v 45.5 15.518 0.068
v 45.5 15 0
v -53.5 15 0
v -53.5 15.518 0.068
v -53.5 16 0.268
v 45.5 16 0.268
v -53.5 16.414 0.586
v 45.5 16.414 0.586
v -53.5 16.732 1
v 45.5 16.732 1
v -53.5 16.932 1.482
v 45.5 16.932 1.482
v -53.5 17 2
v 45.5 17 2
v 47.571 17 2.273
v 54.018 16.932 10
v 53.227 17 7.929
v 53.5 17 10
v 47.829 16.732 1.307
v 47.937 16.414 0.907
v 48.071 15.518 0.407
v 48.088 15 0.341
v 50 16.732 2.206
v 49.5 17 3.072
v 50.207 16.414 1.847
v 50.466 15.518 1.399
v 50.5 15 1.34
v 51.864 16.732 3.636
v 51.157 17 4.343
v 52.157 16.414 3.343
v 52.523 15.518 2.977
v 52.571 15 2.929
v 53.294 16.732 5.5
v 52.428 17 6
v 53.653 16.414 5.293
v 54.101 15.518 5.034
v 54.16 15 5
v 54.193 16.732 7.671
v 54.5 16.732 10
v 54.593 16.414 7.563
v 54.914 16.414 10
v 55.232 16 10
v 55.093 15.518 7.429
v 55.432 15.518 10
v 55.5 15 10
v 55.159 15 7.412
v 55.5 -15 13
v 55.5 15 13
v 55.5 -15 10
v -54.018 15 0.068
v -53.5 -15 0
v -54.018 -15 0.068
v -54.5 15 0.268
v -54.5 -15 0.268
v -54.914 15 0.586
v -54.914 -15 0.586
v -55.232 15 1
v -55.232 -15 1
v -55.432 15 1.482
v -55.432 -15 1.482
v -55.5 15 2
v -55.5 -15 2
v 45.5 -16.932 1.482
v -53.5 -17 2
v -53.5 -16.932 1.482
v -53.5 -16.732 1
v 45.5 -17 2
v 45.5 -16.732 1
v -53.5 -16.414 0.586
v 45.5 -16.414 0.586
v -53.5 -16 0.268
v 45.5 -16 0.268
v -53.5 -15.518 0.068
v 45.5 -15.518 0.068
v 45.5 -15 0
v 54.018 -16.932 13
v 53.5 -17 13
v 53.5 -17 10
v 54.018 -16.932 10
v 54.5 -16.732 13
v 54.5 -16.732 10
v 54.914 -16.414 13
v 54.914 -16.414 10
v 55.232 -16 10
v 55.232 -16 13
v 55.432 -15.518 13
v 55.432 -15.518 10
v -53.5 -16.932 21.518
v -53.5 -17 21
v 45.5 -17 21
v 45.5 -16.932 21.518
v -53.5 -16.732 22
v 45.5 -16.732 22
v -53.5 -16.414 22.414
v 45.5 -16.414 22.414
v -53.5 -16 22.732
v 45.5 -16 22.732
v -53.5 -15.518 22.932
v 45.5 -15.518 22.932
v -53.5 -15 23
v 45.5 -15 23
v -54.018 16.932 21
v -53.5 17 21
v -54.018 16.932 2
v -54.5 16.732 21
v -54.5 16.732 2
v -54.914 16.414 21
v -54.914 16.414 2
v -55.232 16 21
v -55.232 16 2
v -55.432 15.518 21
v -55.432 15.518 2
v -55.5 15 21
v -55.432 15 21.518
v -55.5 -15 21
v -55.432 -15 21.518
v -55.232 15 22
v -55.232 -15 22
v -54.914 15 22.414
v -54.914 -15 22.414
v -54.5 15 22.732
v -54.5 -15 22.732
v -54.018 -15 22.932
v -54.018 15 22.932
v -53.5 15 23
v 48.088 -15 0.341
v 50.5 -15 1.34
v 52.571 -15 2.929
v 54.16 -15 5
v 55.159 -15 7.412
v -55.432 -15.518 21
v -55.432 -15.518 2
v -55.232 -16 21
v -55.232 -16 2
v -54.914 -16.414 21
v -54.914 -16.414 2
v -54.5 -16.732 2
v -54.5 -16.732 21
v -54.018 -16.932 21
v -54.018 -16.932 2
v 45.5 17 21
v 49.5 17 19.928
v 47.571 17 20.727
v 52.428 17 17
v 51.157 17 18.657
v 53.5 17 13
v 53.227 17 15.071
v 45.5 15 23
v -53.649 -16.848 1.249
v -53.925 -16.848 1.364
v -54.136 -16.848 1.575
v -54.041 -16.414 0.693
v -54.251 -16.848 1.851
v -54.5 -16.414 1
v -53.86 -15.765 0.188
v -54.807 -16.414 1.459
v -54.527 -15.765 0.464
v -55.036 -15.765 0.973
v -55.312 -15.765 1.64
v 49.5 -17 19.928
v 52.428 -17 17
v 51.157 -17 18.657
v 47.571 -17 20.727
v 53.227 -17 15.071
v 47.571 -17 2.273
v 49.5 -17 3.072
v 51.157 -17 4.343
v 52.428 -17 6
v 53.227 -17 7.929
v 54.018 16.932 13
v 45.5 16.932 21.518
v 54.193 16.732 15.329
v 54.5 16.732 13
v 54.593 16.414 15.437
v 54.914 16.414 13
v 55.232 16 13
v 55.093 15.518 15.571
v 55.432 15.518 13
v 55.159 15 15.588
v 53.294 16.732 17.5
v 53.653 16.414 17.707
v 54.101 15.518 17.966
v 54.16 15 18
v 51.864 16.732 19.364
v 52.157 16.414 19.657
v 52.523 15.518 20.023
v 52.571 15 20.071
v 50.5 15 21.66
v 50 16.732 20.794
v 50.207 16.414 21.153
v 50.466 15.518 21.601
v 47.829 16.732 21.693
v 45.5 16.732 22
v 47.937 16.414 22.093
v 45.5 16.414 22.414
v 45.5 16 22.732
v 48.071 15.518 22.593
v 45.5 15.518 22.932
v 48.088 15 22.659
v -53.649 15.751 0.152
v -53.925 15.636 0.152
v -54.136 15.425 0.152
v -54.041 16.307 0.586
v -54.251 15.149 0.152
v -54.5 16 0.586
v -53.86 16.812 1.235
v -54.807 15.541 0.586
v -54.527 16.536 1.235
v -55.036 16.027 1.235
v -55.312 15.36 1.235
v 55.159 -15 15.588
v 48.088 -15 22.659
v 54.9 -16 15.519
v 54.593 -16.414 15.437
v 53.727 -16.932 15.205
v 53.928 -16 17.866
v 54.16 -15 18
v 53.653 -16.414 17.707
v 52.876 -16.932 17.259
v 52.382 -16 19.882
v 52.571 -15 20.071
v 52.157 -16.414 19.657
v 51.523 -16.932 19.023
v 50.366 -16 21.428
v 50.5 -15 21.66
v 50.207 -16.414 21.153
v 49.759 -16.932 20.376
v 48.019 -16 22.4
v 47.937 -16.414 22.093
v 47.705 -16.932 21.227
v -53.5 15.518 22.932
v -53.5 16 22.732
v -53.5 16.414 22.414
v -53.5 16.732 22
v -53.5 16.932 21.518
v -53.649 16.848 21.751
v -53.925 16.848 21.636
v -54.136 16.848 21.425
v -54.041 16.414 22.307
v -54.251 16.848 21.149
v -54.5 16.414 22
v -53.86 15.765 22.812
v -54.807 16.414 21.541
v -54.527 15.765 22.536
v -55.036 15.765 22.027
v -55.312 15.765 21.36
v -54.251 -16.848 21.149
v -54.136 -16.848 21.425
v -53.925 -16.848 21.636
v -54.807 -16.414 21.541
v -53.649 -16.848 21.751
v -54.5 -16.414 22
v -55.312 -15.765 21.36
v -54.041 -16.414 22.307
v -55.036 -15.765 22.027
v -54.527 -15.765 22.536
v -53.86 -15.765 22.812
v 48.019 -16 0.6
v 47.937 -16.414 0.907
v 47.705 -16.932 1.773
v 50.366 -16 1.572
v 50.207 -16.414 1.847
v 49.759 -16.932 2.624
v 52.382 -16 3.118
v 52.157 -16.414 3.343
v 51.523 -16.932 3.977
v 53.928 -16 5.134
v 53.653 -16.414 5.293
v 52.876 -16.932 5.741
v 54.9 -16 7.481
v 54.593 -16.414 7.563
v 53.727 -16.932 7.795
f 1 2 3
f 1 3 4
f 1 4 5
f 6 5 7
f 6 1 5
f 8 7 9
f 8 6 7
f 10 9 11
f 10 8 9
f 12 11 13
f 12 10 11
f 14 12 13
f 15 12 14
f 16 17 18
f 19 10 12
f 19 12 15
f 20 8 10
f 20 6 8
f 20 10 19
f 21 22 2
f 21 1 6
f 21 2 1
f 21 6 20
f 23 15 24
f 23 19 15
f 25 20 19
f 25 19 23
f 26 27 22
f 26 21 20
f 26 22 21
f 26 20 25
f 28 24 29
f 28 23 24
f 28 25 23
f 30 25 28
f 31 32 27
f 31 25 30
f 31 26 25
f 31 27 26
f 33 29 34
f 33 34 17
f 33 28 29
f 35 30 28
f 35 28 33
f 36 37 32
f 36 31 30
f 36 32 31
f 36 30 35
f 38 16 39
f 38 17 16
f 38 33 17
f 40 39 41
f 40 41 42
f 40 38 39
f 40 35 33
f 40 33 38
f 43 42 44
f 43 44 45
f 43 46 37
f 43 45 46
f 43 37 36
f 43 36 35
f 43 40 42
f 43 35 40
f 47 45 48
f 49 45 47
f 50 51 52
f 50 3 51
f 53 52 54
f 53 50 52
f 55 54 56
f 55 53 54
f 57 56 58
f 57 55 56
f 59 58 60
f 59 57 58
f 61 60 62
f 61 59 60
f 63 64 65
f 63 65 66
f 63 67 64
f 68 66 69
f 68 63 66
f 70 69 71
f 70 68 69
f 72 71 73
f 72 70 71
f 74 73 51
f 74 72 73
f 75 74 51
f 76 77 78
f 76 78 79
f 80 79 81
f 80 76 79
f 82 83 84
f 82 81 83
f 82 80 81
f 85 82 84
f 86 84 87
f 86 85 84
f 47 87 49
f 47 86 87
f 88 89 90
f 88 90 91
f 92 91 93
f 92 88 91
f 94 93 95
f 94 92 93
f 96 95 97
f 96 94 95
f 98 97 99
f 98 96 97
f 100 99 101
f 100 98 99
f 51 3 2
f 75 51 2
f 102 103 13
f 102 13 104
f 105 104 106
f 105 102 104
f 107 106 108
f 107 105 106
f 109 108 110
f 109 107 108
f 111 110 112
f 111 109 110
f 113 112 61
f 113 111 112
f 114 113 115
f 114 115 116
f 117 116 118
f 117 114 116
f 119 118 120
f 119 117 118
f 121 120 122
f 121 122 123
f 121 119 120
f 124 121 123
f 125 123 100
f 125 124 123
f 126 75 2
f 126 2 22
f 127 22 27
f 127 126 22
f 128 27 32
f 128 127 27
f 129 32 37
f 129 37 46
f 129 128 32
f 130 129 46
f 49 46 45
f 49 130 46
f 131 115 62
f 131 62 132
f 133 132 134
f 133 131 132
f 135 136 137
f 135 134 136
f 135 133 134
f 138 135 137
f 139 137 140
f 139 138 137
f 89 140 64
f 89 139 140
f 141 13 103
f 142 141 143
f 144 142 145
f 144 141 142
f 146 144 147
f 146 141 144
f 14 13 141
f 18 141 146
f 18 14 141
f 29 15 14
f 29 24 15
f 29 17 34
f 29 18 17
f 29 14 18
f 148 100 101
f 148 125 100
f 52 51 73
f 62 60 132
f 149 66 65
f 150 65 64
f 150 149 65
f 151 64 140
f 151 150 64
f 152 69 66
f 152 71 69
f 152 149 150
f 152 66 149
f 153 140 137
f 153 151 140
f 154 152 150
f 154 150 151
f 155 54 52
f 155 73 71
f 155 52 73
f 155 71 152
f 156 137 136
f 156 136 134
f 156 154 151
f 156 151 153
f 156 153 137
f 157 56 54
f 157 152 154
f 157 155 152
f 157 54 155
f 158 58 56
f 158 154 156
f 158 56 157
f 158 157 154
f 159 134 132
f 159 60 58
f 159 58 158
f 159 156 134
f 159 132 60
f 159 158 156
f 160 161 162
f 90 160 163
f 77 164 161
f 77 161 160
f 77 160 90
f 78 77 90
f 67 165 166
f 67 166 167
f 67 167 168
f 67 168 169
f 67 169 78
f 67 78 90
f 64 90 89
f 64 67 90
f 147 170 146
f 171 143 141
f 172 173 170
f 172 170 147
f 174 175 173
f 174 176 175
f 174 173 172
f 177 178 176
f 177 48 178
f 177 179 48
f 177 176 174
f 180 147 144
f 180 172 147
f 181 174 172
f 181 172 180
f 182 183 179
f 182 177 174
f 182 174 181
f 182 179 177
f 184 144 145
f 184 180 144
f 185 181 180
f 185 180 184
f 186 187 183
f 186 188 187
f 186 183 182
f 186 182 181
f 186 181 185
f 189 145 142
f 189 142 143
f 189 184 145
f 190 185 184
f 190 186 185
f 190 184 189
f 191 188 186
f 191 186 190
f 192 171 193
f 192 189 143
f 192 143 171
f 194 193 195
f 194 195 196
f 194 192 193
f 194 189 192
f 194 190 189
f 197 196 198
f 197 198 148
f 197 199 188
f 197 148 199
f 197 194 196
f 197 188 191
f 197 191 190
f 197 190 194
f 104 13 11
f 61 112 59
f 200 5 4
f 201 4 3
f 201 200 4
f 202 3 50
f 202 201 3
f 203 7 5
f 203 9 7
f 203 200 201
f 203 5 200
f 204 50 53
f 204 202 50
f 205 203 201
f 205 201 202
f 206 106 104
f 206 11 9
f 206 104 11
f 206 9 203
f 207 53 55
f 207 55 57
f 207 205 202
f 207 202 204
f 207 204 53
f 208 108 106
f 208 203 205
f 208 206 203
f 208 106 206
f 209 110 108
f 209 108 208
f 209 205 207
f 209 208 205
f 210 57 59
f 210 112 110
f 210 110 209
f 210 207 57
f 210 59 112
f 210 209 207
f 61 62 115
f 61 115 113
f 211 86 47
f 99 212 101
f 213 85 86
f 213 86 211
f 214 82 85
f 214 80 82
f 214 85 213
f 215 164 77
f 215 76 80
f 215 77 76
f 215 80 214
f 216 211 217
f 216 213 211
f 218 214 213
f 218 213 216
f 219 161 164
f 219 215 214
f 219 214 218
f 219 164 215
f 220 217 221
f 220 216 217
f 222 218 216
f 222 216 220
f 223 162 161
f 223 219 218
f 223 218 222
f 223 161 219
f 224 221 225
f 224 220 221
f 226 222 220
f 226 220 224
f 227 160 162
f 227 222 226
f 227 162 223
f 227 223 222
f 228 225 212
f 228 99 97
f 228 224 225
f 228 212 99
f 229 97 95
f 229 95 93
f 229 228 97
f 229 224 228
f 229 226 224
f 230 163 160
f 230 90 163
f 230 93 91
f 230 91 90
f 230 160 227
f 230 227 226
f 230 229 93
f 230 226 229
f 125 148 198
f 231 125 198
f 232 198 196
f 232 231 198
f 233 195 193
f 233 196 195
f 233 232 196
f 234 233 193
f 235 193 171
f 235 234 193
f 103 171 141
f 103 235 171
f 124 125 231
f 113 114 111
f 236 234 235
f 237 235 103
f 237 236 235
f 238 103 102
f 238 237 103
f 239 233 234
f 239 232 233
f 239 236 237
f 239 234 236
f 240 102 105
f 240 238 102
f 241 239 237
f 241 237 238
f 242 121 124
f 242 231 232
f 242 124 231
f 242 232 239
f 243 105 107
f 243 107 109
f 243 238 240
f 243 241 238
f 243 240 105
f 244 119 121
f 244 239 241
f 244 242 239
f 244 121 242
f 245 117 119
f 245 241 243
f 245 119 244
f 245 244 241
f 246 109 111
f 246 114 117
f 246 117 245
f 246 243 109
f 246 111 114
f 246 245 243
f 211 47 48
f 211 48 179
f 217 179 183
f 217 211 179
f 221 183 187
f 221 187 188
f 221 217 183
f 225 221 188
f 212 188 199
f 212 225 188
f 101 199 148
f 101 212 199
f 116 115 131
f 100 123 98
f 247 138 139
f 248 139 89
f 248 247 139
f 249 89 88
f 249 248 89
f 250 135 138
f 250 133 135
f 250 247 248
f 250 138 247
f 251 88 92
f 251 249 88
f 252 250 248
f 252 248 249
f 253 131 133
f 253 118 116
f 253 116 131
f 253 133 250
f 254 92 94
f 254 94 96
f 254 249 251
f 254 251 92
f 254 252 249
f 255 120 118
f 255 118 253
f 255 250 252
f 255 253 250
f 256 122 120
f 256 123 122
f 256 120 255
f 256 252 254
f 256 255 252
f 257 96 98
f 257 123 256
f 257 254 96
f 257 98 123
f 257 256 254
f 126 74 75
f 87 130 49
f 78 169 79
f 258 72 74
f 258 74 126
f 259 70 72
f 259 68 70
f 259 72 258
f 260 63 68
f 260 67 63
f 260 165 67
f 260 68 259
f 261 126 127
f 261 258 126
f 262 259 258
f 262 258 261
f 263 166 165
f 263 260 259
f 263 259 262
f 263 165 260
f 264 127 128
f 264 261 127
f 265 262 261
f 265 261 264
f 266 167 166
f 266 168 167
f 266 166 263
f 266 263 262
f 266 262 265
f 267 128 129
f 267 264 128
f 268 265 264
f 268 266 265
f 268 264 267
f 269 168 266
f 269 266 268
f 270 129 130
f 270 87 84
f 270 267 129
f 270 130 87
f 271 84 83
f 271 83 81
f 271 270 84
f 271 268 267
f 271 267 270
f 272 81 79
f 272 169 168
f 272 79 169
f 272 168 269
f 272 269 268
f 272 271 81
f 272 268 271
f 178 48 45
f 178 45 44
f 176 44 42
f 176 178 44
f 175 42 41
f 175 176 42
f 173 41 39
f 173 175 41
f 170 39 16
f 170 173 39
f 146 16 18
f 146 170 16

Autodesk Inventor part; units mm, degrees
ref_plane "YZ Plane" through (0, 0, 0) normal (1, 0, 0) x (0, 1, 0)
ref_plane "XZ Plane" through (0, 0, 0) normal (0, 1, 0) x (-1, 0, 0)
ref_plane "XY Plane" through (0, 0, 0) normal (0, 0, 1) x (1, 0, 0)
sketch "スケッチ1" plane through (0, 0, 0) normal (0, 0, 1) x (1, 0, 0)
  line L0 (-55.5, 17) -> (55.5, 17)
  line L1 (55.5, 17) -> (55.5, -17)
  line L2 (55.5, -17) -> (-55.5, -17)
  line L3 (-55.5, -17) -> (-55.5, 17)
  line L4 (-55.5, 17) -> (55.5, -17) construction
  line L5 (55.5, 17) -> (-55.5, -17) construction
  point P0 (0, 0)
  dimension "d0" = 111
  dimension "d1" = 34
extrude "押し出し1" add sketch "スケッチ1" along normal blind 23
fillet "フィレット1" radius 10 2 edges at (55.5, 0, 23) (55.5, 0, 0)
fillet "フィレット2" radius 2 14 edges at (-55.5, 0, 23) (-55.5, 17, 11.5) (-55.5, 0, 0) (-55.5, -17, 11.5) (52.5711, 17, 20.0711) (55.5, 17, 11.5) (52.5711, 17, 2.9289) (-5, 17, 0) (-5, 17, 23) (52.5711, -17, 20.0711) (55.5, -17, 11.5) (52.5711, -17, 2.9289) (-5, -17, 0) (-5, -17, 23)
properties part number "HP-G830C2800S3"
